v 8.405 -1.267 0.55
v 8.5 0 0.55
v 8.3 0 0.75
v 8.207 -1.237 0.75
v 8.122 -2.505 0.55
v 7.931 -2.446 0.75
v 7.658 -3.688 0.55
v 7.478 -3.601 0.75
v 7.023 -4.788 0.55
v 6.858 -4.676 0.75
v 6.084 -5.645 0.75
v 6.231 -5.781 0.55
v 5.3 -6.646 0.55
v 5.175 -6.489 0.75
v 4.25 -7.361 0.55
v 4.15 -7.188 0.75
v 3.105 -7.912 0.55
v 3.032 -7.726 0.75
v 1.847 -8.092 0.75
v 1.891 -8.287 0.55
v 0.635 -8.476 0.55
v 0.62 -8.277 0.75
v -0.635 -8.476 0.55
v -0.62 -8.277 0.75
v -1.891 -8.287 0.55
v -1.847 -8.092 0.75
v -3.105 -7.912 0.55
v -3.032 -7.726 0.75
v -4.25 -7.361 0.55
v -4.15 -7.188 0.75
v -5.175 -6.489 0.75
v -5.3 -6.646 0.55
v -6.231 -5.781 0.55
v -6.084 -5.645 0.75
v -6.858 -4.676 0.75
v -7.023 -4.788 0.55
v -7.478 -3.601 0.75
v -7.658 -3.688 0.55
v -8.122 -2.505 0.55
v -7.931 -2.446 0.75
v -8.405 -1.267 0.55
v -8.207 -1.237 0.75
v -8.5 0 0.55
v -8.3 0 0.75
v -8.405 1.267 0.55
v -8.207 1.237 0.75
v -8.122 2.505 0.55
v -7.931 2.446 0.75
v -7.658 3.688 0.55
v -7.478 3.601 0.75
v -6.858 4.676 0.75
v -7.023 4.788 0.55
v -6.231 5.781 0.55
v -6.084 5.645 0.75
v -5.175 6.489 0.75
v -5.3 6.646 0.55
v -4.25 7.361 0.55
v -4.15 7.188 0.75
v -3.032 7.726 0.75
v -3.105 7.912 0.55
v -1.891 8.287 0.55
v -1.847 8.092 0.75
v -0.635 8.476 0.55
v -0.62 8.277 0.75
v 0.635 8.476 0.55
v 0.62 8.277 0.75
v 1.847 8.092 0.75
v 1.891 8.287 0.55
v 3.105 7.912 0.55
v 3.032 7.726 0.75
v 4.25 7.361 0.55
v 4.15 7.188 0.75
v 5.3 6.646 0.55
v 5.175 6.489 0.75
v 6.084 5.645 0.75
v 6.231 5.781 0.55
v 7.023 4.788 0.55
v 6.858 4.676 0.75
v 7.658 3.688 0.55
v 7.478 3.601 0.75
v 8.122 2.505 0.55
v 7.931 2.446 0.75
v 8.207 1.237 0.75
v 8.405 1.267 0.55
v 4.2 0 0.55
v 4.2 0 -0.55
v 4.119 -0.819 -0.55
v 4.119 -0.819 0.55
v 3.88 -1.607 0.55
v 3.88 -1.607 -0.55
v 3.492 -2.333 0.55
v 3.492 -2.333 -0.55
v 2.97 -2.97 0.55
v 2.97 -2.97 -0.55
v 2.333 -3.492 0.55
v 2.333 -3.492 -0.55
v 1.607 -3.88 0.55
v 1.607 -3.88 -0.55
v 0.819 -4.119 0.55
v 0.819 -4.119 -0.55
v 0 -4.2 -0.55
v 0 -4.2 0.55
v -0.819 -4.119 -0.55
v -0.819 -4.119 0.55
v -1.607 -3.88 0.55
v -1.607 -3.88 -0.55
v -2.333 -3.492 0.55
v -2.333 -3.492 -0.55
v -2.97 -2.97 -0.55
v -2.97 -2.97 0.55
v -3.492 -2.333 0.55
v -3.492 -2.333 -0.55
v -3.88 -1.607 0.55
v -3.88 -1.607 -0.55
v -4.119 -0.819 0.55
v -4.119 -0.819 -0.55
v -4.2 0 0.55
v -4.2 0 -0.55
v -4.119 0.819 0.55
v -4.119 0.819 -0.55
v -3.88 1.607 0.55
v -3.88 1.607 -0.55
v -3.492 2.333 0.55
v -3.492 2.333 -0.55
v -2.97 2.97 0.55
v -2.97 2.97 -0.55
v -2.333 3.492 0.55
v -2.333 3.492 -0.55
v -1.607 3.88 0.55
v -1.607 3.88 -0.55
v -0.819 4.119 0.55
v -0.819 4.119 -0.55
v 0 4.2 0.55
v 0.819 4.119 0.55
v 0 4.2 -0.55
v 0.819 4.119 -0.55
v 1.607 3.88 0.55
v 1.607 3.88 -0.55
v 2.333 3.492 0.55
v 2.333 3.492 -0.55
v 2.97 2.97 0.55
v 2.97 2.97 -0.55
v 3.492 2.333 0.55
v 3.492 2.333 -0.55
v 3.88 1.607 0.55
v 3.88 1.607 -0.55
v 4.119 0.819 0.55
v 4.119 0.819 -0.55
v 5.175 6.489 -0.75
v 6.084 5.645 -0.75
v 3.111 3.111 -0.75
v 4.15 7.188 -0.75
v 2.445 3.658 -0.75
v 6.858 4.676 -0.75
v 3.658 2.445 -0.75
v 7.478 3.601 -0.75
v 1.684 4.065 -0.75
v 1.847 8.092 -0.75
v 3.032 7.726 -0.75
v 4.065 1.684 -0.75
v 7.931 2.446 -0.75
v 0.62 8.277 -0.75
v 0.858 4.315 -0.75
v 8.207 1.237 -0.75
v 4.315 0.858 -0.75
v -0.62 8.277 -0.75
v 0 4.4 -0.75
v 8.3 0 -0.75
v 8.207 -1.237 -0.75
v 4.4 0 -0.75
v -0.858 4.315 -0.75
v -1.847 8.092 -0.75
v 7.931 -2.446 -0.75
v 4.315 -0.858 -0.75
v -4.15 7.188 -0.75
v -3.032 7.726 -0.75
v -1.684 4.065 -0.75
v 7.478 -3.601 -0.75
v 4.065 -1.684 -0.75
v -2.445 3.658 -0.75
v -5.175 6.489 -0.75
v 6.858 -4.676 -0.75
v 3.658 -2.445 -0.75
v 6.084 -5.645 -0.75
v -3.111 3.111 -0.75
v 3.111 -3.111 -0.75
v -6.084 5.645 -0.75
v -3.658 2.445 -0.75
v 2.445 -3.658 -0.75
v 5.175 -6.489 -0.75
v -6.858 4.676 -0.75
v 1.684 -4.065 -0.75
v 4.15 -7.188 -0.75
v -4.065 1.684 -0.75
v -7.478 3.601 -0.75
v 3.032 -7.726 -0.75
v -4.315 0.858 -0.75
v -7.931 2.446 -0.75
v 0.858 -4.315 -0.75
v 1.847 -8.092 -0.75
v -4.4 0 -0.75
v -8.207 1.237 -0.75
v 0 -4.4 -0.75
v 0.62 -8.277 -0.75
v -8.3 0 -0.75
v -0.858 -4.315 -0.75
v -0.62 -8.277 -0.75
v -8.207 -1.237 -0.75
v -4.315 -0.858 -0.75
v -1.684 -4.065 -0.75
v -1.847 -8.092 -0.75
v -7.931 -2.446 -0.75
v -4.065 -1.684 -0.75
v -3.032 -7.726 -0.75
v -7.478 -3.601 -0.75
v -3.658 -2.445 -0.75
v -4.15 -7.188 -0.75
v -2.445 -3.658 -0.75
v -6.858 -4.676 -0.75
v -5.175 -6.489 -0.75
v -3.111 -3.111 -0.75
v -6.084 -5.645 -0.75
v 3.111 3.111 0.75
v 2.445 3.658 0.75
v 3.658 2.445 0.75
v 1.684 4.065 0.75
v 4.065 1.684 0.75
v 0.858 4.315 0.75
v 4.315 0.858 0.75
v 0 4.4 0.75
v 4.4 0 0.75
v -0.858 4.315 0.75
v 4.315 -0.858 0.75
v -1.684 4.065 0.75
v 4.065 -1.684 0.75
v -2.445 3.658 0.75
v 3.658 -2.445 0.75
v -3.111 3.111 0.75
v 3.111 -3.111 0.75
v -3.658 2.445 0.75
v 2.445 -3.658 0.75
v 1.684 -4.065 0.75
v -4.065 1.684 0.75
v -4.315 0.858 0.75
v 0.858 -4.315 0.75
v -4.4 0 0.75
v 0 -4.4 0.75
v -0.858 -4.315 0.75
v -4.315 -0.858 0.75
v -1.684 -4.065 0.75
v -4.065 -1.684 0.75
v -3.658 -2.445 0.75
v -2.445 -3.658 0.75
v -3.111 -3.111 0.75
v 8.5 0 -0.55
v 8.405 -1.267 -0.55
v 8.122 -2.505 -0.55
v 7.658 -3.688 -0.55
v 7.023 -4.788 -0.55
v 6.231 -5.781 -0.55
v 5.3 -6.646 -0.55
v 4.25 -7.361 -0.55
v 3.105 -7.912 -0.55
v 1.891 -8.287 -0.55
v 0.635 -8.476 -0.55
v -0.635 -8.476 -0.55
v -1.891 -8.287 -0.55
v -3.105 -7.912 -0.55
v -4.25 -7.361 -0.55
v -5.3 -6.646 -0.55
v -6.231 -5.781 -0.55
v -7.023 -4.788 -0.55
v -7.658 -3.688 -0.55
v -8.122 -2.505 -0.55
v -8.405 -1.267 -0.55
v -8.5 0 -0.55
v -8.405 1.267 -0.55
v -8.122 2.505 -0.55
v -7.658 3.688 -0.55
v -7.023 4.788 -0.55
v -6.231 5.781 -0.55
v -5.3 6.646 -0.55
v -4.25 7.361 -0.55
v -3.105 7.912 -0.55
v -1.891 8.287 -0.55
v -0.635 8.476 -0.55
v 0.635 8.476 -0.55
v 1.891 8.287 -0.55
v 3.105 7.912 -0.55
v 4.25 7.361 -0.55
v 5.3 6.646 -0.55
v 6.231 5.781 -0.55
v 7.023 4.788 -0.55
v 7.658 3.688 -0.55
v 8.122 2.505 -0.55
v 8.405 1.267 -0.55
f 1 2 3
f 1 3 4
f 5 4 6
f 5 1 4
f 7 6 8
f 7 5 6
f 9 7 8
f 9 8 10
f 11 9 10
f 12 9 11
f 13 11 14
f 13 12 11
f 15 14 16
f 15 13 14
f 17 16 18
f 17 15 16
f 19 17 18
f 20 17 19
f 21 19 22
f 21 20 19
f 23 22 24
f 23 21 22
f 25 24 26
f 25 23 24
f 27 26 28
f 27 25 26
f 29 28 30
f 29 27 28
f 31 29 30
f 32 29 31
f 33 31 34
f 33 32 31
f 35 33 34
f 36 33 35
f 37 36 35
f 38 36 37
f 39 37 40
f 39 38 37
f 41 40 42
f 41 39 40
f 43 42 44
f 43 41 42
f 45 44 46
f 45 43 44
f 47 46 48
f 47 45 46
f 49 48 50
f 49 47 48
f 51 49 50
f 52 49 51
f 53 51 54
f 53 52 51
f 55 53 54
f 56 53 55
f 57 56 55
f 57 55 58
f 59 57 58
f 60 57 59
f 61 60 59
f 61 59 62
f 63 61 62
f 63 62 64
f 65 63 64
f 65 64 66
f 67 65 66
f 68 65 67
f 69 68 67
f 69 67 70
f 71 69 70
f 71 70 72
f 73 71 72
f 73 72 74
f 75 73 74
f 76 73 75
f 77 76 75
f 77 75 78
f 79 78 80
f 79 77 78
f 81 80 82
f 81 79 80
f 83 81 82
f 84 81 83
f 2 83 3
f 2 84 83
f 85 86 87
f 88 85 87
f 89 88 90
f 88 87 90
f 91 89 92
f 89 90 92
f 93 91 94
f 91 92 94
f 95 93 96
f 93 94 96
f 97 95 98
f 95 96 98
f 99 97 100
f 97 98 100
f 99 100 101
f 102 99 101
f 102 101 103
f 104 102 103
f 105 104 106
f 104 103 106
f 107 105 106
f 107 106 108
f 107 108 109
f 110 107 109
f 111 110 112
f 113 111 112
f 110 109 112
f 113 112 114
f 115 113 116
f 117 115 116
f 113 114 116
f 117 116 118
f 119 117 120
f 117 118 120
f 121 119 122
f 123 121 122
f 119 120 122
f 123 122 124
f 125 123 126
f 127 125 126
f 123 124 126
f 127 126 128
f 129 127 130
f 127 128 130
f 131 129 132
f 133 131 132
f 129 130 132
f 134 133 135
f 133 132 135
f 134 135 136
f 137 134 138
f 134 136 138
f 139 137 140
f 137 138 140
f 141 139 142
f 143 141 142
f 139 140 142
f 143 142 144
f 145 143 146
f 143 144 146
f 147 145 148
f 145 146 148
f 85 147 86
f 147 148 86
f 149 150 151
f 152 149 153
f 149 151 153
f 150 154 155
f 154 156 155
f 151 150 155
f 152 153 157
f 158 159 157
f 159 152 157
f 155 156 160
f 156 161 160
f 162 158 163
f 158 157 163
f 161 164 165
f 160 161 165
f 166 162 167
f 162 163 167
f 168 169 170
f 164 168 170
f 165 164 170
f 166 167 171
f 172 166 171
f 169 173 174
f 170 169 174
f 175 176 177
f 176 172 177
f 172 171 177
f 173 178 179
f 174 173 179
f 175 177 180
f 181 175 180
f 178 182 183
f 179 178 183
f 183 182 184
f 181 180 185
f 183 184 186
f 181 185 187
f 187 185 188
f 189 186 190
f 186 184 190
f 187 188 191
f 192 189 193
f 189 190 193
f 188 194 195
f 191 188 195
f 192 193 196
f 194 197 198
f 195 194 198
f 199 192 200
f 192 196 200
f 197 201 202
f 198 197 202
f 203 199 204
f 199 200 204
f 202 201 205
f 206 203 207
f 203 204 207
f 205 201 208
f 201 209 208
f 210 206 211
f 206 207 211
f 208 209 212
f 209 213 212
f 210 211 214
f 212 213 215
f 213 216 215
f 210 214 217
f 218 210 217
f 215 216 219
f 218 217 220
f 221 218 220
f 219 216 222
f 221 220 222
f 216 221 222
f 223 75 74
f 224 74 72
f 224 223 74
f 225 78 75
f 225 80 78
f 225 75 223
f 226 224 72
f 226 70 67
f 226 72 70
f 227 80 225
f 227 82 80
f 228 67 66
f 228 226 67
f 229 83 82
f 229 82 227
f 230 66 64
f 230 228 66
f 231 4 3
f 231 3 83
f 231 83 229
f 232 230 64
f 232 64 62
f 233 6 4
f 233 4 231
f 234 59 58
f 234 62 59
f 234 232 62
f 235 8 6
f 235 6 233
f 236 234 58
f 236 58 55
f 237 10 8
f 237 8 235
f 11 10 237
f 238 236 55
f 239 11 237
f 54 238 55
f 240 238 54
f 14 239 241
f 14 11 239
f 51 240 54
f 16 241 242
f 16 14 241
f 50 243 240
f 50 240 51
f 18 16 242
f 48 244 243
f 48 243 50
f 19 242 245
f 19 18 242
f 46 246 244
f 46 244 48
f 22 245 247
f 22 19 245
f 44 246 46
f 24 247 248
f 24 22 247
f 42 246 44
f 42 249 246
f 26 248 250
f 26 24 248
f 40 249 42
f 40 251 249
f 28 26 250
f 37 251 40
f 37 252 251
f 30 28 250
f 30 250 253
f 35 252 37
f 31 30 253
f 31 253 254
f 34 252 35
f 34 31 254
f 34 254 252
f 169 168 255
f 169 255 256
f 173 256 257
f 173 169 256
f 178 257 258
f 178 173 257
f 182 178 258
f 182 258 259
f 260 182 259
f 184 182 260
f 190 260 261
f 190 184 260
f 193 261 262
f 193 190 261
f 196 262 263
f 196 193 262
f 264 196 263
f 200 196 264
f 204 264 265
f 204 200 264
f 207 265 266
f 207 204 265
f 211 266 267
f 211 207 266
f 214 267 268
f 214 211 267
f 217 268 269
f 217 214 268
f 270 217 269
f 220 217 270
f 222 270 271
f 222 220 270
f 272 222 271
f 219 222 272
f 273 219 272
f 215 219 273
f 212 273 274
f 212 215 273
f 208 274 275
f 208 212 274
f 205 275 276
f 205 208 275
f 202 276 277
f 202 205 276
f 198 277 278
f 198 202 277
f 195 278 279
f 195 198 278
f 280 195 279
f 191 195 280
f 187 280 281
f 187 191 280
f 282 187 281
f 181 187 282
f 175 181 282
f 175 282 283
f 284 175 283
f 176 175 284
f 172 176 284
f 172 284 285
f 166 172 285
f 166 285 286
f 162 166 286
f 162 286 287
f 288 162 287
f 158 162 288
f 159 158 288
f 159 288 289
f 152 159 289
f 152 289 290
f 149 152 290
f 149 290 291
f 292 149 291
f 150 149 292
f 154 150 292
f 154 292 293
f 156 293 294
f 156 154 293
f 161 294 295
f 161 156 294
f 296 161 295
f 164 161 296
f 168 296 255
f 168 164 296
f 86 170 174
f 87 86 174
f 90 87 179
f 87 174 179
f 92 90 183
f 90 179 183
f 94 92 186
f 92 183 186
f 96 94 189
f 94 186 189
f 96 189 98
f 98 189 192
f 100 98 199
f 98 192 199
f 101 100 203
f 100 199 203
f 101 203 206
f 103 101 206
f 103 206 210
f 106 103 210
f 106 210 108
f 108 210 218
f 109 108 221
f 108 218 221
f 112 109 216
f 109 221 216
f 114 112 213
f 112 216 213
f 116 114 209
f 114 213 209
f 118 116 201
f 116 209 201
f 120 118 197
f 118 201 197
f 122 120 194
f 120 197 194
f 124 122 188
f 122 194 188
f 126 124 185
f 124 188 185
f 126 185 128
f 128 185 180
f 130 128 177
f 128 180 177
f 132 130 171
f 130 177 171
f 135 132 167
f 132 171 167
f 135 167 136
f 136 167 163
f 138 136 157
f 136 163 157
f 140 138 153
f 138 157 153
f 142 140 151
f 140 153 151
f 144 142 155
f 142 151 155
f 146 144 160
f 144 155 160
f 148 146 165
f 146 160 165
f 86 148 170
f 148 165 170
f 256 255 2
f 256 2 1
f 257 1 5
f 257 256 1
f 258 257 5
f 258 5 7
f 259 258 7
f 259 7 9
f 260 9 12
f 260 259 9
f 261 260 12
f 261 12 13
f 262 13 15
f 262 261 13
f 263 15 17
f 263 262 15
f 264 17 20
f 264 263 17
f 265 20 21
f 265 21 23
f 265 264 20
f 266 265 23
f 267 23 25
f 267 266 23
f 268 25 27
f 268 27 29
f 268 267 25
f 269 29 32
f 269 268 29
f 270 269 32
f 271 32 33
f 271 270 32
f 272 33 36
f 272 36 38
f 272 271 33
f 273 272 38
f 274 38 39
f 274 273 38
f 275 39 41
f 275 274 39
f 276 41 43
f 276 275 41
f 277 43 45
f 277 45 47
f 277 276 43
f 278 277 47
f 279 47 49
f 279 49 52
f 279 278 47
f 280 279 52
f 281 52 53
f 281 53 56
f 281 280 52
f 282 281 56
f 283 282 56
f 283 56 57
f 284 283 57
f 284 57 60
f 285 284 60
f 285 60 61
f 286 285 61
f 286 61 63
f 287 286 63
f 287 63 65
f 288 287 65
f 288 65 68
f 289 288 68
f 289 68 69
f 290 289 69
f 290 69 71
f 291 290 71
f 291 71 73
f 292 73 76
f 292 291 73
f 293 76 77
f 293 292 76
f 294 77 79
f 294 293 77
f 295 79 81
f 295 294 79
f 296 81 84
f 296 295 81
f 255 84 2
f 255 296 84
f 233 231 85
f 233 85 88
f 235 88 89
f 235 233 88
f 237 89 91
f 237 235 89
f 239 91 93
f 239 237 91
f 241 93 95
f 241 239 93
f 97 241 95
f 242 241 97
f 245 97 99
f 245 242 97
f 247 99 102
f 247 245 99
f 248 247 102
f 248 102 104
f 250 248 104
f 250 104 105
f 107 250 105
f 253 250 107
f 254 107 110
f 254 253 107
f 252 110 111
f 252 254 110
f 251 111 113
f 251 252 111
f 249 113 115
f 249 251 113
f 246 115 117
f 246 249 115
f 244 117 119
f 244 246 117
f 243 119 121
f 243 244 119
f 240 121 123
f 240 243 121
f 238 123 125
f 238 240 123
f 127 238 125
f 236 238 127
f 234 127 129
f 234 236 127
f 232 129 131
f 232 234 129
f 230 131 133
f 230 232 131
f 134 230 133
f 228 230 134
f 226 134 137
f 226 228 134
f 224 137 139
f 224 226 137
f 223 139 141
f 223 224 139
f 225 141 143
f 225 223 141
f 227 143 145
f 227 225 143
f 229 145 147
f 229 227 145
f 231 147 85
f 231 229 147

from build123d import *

# Parameters (mm, degrees)
SKETCH1_W     = 4.3
SKETCH1_H     = 1.5
CHAMFER1_SIZE = 0.2


with BuildPart() as part:
    # Sketch1 → Revolve1 (revolve)
    with BuildSketch(Plane(origin=(0, 0, 0), x_dir=(1, 0, 0), z_dir=(0, 1, 0))):
        with Locations((6.35, 0)):
            Rectangle(SKETCH1_W, SKETCH1_H)
    revolve(axis=Axis((0, 0, 0), (0, 0, -1)))

    # Chamfer1
    chamfer1_edges = [part.edges().sort_by_distance(p)[0] for p in [
        (-4.2, 0, -0.75),
        (-8.5, 0, -0.75),
        (-8.5, 0, 0.75),
        (-4.2, 0, 0.75),
    ]]
    chamfer(chamfer1_edges, length=CHAMFER1_SIZE)


solid = part.part
